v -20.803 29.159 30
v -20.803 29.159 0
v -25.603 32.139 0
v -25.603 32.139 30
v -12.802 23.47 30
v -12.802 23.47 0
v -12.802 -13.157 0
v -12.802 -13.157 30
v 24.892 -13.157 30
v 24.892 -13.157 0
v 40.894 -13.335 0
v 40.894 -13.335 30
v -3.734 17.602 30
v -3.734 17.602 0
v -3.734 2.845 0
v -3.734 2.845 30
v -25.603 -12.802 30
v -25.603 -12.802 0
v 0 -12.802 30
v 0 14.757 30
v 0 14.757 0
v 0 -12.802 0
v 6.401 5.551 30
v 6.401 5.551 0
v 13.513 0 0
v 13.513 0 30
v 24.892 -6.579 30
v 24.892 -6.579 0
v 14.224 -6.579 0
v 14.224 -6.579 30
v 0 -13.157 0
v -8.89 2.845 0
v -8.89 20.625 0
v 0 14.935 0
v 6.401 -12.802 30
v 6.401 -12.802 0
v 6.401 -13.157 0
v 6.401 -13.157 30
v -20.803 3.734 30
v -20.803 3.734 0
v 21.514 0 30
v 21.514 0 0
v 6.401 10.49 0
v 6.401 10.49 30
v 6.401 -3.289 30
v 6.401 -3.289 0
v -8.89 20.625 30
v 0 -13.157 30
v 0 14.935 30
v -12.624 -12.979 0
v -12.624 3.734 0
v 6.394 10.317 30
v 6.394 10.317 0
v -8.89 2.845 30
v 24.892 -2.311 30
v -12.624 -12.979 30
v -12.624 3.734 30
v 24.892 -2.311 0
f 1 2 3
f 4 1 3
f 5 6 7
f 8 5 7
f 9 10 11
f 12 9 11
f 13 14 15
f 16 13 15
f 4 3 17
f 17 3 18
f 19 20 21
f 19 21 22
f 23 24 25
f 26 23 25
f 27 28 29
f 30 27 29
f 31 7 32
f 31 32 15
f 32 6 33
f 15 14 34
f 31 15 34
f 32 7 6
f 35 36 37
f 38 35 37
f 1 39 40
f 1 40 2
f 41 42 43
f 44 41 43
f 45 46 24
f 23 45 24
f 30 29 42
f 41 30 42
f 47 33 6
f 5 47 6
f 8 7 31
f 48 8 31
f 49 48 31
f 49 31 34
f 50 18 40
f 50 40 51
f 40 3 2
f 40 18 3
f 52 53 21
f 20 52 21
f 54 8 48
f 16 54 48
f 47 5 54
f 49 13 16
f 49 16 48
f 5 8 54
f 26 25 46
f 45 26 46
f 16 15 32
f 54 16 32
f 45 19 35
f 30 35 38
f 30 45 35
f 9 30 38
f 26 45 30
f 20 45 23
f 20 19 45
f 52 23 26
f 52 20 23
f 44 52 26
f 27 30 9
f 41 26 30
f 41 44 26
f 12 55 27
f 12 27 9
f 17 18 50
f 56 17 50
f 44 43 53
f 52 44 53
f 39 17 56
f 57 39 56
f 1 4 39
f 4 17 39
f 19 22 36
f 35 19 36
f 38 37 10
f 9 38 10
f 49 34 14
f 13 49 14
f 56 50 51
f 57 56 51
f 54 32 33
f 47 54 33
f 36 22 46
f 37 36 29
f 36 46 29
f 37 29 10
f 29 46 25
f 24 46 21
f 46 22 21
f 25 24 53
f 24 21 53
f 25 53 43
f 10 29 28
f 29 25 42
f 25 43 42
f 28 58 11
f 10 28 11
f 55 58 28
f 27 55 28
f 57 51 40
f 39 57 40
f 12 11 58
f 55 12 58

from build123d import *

# Parameters (mm, degrees)
F5_DEPTH = 30
F6_DEPTH = 30
F7_DEPTH = 30
F8_DEPTH = 30
F9_DEPTH = 30


with BuildPart() as f5:
    # F0 (on Top) → F5 (new body)
    with BuildSketch(Plane.XY):
        Polygon((-20.8026, 29.159199), (-25.603201, 32.138883), (-25.603201, -12.8016), (-12.6238, -12.9794), (-12.6238, 3.7338), (-20.8026, 3.7338), align=None)
    extrude(amount=F5_DEPTH)


with BuildPart() as f6:
    # F2 (on Top) → F6 (new body)
    with BuildSketch(Plane.XY):
        Polygon((6.4008, 10.3124), (0, 14.7574), (0, -12.8016), (6.4008, -12.8016), align=None)
    extrude(amount=F6_DEPTH)

    # F3 (on Top) → F8 (join)
    with BuildSketch(Plane.XY):
        Polygon((21.513801, 0), (6.4008, 10.4902), (6.223, 5.6896), (13.5128, 0), (6.4008, -3.2893), (6.4008, -13.1572), (25.069803, -13.1572), (25.069803, -6.5786), (14.224, -6.5786), align=None)
    extrude(amount=F8_DEPTH)

    # F4 (on Top) → F9 (join)
    with BuildSketch(Plane.XY):
        Polygon((24.892, -2.3114), (24.892, -13.1572), (40.894002, -13.335001), align=None)
    extrude(amount=F9_DEPTH)


with BuildPart() as f7:
    # F1 (on Top) → F7 (new body)
    with BuildSketch(Plane.XY):
        Polygon((-12.8016, 23.469599), (-12.8016, -13.1572), (0, -13.1572), (0, 14.9352), (-3.7338, 17.6022), (-3.7338, 2.8448), (-8.89, 2.8448), (-8.89, 20.6248), align=None)
    extrude(amount=F7_DEPTH)


solid = Compound([f5.part, f6.part, f7.part])
